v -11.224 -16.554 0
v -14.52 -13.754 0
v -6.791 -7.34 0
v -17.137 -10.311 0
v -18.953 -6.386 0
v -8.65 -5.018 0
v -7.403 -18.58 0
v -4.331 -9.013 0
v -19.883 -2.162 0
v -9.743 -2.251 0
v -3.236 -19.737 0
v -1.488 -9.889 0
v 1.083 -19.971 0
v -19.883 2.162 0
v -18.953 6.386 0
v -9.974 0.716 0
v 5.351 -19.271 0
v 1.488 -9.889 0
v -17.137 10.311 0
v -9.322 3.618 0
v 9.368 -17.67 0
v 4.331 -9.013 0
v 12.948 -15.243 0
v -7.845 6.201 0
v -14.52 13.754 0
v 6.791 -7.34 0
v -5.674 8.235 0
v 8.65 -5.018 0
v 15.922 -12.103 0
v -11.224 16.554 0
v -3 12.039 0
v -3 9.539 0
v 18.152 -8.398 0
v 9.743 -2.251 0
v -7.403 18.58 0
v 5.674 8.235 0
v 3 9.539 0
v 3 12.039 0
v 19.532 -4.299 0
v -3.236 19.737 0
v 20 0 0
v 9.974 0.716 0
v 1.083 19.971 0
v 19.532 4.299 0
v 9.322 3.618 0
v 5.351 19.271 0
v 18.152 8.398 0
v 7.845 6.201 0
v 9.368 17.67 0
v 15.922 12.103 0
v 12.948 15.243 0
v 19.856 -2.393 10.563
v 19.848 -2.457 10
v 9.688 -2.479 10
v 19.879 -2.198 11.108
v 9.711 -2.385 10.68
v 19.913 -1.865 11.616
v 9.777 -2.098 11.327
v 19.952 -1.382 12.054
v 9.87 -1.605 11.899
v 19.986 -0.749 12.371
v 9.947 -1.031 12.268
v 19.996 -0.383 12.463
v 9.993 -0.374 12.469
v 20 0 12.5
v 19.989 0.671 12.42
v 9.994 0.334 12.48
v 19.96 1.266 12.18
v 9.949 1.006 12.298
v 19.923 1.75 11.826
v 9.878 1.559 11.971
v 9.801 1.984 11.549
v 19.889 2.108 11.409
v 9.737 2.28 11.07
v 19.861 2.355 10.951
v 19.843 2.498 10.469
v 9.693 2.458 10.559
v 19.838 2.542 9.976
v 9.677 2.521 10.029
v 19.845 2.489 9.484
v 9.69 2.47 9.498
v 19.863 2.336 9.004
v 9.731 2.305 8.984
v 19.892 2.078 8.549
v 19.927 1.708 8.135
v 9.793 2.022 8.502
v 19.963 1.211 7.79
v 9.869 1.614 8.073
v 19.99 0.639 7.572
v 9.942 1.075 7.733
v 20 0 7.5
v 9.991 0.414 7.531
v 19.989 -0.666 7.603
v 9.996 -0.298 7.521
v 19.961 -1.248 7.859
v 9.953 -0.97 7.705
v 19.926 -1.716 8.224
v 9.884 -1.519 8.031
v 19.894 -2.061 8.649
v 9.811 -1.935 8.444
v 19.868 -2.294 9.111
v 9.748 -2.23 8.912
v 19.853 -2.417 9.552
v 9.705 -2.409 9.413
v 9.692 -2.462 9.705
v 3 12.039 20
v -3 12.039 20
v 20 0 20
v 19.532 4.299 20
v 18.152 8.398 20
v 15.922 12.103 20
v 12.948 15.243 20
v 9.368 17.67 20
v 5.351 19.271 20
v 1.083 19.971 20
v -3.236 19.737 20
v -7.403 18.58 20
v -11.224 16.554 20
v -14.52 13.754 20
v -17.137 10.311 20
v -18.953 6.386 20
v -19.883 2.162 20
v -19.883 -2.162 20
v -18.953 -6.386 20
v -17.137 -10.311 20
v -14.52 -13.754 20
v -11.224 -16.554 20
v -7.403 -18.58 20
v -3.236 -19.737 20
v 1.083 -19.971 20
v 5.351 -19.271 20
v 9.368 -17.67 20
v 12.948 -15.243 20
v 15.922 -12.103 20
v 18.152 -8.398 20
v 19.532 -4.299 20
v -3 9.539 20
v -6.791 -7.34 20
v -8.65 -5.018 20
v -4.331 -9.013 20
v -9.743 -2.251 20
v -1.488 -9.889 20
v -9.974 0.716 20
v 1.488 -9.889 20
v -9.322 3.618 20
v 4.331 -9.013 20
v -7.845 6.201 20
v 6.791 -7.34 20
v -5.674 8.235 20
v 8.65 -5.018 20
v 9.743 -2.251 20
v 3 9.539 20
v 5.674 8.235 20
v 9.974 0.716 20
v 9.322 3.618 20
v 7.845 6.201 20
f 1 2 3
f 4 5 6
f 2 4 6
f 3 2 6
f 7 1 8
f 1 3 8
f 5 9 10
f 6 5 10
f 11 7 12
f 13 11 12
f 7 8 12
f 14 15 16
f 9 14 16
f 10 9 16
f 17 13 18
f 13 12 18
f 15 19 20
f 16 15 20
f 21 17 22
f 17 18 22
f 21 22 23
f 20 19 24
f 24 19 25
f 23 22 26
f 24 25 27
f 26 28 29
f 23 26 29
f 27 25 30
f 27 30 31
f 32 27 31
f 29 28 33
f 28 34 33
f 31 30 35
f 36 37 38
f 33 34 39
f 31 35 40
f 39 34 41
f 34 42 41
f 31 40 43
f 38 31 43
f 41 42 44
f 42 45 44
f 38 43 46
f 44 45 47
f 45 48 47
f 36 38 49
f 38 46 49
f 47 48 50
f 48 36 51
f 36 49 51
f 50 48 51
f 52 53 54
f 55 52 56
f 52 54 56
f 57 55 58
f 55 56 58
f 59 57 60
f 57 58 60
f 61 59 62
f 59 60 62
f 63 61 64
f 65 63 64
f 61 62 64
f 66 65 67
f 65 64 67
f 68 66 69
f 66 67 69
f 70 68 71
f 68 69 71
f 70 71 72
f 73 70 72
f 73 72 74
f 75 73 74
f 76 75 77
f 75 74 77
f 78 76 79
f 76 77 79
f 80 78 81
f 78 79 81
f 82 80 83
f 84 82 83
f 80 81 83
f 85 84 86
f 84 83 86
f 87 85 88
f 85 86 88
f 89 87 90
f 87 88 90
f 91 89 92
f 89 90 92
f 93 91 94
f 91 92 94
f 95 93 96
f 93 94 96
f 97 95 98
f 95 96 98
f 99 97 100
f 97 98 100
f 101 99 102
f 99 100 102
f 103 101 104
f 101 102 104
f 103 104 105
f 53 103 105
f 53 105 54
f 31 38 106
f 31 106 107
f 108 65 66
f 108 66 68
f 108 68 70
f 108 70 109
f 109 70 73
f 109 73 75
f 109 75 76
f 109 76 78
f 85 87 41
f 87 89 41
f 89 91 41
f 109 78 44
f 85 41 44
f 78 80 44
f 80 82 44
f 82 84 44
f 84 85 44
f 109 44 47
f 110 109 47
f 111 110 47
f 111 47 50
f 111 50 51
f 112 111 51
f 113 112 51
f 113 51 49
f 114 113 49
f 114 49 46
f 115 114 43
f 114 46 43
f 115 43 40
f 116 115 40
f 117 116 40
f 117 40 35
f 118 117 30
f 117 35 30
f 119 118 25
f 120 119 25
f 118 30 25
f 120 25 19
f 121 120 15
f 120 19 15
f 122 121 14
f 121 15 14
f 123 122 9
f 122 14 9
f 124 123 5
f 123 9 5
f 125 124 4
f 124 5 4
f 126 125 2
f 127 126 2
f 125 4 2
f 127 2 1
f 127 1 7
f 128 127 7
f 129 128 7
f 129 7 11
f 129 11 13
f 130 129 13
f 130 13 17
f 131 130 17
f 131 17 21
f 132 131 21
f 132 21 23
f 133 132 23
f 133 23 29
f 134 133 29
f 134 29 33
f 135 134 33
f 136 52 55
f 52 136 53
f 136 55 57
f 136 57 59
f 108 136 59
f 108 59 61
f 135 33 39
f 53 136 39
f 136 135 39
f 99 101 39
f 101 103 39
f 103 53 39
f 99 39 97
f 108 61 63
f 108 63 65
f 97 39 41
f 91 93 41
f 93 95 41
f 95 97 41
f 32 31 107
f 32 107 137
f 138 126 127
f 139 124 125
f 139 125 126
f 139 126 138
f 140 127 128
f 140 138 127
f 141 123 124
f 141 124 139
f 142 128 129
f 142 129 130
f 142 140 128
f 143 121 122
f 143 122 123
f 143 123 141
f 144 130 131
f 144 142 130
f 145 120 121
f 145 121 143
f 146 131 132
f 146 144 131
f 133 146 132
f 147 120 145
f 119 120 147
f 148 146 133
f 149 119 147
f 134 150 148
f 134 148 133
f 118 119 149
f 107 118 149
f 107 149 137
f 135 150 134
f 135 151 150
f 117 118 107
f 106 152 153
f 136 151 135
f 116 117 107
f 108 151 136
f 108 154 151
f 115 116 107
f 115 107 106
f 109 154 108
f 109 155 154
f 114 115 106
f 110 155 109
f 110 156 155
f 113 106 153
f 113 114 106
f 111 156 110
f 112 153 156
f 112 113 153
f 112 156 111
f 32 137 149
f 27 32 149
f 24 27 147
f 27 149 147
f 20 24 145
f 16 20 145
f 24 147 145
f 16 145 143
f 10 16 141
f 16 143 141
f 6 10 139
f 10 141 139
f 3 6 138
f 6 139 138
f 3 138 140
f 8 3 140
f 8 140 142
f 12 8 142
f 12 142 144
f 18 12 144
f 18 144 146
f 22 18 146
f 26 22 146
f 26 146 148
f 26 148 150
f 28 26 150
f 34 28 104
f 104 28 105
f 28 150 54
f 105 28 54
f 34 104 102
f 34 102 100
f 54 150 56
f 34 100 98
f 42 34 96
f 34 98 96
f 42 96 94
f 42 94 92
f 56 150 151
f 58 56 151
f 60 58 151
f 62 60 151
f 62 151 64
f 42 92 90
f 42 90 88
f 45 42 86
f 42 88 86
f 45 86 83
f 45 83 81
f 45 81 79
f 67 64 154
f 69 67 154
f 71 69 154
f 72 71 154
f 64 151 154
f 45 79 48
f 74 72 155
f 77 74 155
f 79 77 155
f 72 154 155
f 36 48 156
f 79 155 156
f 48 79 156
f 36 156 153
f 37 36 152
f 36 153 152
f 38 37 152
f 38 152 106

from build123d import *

# Parameters (mm, degrees)
ESQUISSE1_R             = 20
BOSS_EXTRU_1_DEPTH      = 20
TROU_TARAUD_M61_D       = 5
TROU_TARAUD_M61_DEPTH   = 17
TROU_TARAUD_M61_TIP     = 1.502151548
ENL_V_MAT_EXTRU_1_DEPTH = 25


with BuildPart() as part:
    # Esquisse1 → Boss.-Extru.1 (new body)
    with BuildSketch(Plane.XY):
        Circle(ESQUISSE1_R)
    extrude(amount=BOSS_EXTRU_1_DEPTH)

    # Trou taraudé M61
    with Locations(Plane(origin=(19.999953956, 0.042915747, 10), x_dir=(-0.002145787, 0.999997698, 0), z_dir=(0.999997698, 0.002145787, 0))):
        with Locations((0, 0)):
            Hole(TROU_TARAUD_M61_D / 2, depth=TROU_TARAUD_M61_DEPTH)
            with Locations((0, 0, -(TROU_TARAUD_M61_DEPTH + TROU_TARAUD_M61_TIP / 2))):  # 118° drill point
                Cone(0, TROU_TARAUD_M61_D / 2, TROU_TARAUD_M61_TIP, mode=Mode.SUBTRACT)

    # Esquisse11 → Enlèv. mat.-Extru.1 (cut)
    with BuildSketch(Plane.XY.offset(20)):
        with BuildLine():
            Line((3, 9.539392014), (3, 12.039392014))
            Line((3, 12.039392014), (-3, 12.039392014))
            Line((-3, 12.039392014), (-3, 9.539392014))
            ThreePointArc((-3, 9.539392014), (0, -10), (3, 9.539392014))
        make_face()
    extrude(amount=-ENL_V_MAT_EXTRU_1_DEPTH, mode=Mode.SUBTRACT)


solid = part.part
